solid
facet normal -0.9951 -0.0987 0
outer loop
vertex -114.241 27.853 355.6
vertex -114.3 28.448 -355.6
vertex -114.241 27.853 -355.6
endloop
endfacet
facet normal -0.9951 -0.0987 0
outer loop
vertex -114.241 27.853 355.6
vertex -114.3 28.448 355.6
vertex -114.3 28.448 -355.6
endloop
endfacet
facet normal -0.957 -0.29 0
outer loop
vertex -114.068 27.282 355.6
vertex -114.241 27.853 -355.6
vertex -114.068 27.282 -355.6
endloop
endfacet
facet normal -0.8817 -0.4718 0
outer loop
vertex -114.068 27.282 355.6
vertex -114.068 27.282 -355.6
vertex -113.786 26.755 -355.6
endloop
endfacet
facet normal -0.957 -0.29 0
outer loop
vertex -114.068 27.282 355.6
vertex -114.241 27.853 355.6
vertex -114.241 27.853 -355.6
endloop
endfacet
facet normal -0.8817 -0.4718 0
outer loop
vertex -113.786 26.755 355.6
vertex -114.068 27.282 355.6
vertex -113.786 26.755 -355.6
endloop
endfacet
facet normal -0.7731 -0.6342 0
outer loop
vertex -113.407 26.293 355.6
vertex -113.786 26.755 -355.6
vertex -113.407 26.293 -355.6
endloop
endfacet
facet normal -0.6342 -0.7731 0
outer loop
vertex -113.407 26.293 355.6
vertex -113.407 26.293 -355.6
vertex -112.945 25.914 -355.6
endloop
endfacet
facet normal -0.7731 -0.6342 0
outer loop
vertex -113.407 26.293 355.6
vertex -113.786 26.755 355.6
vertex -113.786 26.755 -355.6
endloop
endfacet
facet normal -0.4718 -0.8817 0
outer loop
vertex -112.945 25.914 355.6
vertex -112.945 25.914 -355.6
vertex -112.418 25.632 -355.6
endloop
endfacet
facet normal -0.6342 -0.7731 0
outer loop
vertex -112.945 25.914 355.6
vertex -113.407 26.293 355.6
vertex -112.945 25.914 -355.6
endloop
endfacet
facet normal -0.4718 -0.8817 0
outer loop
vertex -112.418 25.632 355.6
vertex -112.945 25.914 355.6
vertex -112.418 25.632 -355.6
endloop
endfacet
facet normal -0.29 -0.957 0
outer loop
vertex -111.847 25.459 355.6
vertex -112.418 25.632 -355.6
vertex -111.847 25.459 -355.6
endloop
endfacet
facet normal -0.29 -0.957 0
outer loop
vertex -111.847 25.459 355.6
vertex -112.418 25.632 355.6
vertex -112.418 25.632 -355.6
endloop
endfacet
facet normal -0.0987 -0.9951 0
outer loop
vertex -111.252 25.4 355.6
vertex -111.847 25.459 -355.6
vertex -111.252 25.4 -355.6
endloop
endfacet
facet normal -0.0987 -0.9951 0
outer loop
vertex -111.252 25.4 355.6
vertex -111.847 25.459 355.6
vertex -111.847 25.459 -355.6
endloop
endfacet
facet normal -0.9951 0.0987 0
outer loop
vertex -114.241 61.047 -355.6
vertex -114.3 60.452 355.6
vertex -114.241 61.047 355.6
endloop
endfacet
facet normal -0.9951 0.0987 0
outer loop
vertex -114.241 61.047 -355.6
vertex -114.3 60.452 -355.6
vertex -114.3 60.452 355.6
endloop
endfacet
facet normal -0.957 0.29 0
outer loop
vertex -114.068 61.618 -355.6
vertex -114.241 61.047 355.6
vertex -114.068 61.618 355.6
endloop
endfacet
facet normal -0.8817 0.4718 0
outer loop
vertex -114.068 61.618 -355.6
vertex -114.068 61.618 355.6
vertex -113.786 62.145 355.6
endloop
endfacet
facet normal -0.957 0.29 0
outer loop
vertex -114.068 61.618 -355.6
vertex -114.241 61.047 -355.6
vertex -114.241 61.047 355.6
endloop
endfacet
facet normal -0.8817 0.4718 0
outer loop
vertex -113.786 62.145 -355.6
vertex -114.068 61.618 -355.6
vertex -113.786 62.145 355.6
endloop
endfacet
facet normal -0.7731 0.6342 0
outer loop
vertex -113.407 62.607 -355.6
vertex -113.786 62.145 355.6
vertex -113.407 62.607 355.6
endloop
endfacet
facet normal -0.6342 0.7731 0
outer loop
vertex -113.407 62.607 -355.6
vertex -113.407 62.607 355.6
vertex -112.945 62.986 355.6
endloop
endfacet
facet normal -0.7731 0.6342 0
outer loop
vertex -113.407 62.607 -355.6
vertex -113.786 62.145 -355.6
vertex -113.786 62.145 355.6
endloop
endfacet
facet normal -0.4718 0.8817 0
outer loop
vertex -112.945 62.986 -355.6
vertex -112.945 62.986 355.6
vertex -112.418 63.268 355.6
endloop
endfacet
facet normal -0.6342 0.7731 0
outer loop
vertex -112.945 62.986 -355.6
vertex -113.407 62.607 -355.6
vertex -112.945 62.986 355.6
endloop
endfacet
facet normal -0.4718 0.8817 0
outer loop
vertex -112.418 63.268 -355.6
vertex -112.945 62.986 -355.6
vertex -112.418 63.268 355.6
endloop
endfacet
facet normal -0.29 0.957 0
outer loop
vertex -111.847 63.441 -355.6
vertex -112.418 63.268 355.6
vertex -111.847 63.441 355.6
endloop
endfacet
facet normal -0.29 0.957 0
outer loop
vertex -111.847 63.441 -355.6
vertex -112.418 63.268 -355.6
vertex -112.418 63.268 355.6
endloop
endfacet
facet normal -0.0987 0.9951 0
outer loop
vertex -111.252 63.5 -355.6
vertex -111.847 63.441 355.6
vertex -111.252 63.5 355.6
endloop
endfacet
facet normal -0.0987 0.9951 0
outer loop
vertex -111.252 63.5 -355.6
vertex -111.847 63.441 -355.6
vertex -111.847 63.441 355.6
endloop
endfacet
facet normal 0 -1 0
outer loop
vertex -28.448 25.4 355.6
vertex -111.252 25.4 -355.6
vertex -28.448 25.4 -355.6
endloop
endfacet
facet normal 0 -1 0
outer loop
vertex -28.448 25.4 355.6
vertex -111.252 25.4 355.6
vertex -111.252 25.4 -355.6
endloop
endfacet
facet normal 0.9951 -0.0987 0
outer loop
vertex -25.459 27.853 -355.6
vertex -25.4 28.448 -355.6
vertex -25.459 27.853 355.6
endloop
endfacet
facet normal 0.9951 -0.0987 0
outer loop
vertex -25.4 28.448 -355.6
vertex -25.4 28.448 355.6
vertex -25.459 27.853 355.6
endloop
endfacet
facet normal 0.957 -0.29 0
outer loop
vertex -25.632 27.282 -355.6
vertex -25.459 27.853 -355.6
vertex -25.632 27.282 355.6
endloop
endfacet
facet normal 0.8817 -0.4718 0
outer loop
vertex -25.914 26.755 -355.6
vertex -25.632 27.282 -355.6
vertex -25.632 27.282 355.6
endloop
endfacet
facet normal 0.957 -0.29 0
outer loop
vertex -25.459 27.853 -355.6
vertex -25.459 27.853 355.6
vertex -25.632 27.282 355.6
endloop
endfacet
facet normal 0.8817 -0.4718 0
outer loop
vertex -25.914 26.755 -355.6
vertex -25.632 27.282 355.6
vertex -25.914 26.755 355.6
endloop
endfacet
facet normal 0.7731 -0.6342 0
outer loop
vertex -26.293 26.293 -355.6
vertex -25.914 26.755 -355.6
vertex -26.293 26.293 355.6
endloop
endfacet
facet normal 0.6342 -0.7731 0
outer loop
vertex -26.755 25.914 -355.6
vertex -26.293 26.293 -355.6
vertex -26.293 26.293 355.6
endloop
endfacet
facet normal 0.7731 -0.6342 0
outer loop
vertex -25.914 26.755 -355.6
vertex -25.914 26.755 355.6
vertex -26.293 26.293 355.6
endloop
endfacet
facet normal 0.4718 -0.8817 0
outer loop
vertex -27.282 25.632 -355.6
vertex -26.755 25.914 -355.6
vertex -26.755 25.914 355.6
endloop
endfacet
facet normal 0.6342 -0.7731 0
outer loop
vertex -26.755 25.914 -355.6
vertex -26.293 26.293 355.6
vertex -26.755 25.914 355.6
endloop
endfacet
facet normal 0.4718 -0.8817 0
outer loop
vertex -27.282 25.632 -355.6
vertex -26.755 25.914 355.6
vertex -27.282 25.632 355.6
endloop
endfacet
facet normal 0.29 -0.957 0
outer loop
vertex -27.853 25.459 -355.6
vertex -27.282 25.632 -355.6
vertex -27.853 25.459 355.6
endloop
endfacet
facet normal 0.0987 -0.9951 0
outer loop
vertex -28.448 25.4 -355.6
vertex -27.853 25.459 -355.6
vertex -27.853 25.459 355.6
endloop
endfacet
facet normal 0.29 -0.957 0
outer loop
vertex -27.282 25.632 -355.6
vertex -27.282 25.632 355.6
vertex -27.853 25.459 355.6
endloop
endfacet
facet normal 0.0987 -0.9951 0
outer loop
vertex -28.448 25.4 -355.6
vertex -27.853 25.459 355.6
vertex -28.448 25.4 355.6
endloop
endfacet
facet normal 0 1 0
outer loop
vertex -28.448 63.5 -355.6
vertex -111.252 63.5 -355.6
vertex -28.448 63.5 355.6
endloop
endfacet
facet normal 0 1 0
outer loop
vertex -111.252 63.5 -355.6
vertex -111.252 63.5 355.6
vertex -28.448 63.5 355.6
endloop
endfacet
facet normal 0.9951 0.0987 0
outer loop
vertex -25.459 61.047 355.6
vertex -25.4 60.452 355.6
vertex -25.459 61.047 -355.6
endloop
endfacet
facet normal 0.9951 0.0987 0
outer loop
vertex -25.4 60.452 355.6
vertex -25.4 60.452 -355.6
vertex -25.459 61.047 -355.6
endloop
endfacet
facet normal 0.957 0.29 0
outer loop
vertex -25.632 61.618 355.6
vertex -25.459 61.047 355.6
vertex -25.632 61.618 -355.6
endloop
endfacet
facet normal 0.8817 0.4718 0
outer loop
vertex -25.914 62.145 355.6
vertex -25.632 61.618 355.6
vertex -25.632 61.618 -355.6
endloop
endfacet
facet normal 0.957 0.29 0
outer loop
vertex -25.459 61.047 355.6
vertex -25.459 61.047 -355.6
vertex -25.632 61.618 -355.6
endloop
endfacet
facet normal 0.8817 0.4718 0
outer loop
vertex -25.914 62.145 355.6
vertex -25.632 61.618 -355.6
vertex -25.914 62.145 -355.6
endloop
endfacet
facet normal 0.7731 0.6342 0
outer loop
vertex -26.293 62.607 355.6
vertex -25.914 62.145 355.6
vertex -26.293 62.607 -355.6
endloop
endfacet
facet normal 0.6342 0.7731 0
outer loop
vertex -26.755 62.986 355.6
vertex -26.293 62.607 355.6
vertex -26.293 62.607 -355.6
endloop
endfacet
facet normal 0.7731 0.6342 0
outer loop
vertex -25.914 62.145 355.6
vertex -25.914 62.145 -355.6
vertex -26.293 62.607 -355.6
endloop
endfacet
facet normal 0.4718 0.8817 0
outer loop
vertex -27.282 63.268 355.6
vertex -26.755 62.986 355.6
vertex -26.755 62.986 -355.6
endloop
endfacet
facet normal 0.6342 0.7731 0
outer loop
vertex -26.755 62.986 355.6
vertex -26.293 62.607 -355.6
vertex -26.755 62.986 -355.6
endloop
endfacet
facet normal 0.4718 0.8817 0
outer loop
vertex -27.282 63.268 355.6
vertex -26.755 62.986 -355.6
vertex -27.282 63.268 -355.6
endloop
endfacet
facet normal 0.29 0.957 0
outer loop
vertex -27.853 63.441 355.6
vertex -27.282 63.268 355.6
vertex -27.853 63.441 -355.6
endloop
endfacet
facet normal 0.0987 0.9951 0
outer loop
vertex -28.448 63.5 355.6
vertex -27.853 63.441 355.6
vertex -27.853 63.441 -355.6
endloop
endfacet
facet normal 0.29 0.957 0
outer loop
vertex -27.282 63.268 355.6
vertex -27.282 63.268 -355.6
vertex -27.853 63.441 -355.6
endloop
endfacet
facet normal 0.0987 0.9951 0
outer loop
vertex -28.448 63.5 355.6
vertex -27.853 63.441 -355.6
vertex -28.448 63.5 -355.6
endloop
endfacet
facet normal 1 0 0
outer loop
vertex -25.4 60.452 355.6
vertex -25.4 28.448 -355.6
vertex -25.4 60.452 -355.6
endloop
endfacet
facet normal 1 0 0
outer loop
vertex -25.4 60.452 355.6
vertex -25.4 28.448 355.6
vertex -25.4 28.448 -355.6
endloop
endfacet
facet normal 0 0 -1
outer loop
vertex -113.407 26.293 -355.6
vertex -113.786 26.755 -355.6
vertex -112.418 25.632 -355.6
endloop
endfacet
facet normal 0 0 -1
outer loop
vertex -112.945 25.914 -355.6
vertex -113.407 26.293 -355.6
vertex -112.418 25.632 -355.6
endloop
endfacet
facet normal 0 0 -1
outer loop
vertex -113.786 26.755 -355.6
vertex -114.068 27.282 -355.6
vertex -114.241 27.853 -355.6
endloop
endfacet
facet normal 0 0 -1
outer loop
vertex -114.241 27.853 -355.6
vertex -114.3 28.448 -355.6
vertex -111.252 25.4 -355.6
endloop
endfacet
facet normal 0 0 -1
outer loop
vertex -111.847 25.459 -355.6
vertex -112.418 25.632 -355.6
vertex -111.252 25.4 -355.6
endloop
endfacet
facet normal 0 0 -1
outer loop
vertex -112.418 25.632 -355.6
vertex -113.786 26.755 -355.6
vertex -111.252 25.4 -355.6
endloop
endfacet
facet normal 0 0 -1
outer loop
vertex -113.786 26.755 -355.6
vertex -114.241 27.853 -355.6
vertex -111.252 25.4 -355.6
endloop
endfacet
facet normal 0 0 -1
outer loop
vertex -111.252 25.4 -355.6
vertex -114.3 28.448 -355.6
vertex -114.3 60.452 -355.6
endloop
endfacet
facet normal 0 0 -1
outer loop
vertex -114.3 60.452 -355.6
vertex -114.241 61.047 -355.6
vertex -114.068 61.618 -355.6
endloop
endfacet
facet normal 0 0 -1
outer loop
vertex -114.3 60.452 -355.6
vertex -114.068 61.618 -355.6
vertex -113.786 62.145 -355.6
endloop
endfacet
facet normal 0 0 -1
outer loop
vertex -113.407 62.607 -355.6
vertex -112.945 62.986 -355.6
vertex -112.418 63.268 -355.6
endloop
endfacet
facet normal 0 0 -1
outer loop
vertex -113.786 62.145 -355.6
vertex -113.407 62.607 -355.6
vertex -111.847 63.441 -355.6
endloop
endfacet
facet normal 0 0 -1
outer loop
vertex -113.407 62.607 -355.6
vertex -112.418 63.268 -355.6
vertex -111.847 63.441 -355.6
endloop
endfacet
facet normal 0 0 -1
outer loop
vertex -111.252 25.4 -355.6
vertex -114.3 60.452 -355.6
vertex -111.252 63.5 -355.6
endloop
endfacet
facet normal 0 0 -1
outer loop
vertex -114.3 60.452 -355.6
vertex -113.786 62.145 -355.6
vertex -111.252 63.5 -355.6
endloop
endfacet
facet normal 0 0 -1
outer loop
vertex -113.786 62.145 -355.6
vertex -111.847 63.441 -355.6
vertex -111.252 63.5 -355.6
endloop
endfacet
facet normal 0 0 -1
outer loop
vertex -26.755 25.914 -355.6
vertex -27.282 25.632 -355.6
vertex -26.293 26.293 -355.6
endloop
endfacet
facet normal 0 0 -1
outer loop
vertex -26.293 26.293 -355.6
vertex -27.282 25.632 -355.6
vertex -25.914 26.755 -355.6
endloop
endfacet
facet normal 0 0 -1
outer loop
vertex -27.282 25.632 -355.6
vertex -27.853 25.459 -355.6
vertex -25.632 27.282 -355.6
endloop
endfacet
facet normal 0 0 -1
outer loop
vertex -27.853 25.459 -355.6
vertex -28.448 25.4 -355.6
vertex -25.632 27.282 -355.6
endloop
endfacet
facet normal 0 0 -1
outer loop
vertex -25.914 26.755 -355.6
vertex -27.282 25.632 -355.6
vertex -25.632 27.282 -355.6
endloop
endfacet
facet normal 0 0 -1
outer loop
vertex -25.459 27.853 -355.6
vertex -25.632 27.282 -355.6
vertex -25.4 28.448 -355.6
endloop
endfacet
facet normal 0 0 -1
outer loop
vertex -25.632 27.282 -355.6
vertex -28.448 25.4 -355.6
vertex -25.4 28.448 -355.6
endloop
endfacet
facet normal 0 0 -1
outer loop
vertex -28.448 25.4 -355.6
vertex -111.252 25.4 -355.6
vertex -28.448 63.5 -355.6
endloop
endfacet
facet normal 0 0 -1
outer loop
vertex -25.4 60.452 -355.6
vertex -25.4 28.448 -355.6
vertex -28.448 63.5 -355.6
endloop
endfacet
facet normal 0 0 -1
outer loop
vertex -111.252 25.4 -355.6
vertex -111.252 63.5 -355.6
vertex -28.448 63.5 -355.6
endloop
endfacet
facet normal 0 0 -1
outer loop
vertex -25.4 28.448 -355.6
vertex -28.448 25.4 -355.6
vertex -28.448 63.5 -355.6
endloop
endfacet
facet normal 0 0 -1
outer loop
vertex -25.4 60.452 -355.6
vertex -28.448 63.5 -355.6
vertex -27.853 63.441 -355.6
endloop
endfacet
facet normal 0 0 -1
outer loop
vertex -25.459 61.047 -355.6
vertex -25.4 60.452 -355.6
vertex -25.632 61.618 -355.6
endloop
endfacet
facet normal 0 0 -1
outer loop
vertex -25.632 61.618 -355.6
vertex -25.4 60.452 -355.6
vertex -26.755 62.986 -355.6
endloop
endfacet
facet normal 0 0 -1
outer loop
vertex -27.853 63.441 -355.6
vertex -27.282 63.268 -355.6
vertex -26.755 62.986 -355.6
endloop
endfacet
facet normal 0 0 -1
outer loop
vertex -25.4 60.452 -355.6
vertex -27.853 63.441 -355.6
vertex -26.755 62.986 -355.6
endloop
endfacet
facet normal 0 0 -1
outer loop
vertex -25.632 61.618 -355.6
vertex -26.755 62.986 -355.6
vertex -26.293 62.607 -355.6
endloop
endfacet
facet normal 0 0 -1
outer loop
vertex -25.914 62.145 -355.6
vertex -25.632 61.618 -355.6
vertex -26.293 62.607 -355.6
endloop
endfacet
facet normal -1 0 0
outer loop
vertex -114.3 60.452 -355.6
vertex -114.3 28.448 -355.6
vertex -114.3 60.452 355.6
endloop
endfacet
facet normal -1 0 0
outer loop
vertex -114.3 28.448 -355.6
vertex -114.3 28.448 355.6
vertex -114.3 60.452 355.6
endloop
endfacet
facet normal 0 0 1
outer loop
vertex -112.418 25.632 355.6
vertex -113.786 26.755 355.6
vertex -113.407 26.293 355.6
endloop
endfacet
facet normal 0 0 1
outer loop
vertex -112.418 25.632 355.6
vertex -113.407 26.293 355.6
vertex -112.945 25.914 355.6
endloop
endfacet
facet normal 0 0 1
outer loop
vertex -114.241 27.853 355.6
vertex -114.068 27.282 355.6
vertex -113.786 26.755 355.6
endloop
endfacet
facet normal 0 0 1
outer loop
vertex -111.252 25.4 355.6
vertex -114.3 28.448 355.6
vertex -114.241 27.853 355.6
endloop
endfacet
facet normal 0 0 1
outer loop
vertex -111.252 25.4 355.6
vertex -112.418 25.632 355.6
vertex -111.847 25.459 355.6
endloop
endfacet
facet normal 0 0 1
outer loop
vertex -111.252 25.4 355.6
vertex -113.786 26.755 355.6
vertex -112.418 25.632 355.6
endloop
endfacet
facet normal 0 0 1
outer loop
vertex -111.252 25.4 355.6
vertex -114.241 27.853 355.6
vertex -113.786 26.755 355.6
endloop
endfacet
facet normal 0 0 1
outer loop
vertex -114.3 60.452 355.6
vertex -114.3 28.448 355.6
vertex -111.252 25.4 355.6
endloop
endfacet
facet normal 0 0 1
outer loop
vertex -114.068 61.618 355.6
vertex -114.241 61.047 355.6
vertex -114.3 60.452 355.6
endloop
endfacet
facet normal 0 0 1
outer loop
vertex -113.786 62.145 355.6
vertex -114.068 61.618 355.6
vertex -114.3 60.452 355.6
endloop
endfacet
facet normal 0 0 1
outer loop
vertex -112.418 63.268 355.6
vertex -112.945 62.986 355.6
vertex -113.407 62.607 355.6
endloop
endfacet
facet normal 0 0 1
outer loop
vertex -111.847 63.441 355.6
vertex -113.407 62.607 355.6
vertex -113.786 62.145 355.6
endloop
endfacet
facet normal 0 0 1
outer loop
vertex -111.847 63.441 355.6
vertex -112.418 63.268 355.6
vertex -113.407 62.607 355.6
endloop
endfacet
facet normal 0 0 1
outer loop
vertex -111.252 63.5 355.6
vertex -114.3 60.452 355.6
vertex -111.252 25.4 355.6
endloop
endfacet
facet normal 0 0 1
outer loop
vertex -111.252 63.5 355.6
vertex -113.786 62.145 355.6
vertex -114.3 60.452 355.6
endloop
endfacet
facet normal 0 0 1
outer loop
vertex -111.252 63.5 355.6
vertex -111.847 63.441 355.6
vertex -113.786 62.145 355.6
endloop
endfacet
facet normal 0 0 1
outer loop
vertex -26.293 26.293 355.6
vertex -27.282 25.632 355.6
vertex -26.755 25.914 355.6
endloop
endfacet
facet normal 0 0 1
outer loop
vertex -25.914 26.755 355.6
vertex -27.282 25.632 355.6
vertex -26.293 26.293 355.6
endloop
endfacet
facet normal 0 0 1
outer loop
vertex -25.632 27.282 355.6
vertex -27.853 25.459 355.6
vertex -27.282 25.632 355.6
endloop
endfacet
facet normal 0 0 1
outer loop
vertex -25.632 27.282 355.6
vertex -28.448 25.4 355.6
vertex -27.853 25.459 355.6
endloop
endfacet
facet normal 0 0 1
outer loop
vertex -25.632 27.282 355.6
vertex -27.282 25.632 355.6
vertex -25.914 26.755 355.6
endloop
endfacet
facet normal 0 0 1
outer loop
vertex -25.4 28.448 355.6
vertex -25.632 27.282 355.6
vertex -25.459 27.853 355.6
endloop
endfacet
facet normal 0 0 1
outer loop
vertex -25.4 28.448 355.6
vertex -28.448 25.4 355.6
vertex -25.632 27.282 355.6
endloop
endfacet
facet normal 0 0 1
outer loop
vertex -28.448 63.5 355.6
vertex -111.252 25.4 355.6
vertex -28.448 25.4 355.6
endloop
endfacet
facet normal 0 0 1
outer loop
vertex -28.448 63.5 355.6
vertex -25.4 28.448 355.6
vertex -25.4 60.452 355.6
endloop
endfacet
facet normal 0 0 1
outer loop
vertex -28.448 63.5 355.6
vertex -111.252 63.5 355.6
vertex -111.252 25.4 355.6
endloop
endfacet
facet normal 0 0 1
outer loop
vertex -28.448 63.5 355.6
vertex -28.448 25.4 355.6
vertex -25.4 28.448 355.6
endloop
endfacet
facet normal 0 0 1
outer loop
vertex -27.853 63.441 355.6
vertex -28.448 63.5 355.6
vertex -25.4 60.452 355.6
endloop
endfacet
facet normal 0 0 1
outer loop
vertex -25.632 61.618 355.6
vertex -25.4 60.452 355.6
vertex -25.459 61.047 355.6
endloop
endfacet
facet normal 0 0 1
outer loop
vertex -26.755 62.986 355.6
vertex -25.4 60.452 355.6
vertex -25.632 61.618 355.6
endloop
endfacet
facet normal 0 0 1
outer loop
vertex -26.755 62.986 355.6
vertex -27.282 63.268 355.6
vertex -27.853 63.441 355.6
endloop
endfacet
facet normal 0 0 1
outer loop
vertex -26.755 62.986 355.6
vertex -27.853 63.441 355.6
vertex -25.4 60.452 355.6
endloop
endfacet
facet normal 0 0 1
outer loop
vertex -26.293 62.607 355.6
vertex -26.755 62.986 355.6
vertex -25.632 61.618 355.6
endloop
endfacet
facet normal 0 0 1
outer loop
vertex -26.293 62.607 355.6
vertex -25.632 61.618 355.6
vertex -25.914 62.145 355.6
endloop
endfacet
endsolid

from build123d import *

# Parameters (mm, degrees)
SKETCH_W  = 88.9
SKETCH_H  = 38.1
PAD_DEPTH = 355.6
FILLET_R  = 3.048


with BuildPart() as part:
    # Sketch → Pad (new body, symmetric)
    with BuildSketch(Plane.XY):
        with Locations((-69.85, 44.45)):
            Rectangle(SKETCH_W, SKETCH_H)
    extrude(amount=PAD_DEPTH, both=True)

    # Fillet
    fillet_edges = [part.edges().sort_by_distance(p)[0] for p in [
        (-25.4, 63.5, 0),
        (-114.3, 63.5, 0),
        (-25.4, 25.4, 0),
        (-114.3, 25.4, 0),
    ]]
    fillet(fillet_edges, radius=FILLET_R)


solid = part.part
